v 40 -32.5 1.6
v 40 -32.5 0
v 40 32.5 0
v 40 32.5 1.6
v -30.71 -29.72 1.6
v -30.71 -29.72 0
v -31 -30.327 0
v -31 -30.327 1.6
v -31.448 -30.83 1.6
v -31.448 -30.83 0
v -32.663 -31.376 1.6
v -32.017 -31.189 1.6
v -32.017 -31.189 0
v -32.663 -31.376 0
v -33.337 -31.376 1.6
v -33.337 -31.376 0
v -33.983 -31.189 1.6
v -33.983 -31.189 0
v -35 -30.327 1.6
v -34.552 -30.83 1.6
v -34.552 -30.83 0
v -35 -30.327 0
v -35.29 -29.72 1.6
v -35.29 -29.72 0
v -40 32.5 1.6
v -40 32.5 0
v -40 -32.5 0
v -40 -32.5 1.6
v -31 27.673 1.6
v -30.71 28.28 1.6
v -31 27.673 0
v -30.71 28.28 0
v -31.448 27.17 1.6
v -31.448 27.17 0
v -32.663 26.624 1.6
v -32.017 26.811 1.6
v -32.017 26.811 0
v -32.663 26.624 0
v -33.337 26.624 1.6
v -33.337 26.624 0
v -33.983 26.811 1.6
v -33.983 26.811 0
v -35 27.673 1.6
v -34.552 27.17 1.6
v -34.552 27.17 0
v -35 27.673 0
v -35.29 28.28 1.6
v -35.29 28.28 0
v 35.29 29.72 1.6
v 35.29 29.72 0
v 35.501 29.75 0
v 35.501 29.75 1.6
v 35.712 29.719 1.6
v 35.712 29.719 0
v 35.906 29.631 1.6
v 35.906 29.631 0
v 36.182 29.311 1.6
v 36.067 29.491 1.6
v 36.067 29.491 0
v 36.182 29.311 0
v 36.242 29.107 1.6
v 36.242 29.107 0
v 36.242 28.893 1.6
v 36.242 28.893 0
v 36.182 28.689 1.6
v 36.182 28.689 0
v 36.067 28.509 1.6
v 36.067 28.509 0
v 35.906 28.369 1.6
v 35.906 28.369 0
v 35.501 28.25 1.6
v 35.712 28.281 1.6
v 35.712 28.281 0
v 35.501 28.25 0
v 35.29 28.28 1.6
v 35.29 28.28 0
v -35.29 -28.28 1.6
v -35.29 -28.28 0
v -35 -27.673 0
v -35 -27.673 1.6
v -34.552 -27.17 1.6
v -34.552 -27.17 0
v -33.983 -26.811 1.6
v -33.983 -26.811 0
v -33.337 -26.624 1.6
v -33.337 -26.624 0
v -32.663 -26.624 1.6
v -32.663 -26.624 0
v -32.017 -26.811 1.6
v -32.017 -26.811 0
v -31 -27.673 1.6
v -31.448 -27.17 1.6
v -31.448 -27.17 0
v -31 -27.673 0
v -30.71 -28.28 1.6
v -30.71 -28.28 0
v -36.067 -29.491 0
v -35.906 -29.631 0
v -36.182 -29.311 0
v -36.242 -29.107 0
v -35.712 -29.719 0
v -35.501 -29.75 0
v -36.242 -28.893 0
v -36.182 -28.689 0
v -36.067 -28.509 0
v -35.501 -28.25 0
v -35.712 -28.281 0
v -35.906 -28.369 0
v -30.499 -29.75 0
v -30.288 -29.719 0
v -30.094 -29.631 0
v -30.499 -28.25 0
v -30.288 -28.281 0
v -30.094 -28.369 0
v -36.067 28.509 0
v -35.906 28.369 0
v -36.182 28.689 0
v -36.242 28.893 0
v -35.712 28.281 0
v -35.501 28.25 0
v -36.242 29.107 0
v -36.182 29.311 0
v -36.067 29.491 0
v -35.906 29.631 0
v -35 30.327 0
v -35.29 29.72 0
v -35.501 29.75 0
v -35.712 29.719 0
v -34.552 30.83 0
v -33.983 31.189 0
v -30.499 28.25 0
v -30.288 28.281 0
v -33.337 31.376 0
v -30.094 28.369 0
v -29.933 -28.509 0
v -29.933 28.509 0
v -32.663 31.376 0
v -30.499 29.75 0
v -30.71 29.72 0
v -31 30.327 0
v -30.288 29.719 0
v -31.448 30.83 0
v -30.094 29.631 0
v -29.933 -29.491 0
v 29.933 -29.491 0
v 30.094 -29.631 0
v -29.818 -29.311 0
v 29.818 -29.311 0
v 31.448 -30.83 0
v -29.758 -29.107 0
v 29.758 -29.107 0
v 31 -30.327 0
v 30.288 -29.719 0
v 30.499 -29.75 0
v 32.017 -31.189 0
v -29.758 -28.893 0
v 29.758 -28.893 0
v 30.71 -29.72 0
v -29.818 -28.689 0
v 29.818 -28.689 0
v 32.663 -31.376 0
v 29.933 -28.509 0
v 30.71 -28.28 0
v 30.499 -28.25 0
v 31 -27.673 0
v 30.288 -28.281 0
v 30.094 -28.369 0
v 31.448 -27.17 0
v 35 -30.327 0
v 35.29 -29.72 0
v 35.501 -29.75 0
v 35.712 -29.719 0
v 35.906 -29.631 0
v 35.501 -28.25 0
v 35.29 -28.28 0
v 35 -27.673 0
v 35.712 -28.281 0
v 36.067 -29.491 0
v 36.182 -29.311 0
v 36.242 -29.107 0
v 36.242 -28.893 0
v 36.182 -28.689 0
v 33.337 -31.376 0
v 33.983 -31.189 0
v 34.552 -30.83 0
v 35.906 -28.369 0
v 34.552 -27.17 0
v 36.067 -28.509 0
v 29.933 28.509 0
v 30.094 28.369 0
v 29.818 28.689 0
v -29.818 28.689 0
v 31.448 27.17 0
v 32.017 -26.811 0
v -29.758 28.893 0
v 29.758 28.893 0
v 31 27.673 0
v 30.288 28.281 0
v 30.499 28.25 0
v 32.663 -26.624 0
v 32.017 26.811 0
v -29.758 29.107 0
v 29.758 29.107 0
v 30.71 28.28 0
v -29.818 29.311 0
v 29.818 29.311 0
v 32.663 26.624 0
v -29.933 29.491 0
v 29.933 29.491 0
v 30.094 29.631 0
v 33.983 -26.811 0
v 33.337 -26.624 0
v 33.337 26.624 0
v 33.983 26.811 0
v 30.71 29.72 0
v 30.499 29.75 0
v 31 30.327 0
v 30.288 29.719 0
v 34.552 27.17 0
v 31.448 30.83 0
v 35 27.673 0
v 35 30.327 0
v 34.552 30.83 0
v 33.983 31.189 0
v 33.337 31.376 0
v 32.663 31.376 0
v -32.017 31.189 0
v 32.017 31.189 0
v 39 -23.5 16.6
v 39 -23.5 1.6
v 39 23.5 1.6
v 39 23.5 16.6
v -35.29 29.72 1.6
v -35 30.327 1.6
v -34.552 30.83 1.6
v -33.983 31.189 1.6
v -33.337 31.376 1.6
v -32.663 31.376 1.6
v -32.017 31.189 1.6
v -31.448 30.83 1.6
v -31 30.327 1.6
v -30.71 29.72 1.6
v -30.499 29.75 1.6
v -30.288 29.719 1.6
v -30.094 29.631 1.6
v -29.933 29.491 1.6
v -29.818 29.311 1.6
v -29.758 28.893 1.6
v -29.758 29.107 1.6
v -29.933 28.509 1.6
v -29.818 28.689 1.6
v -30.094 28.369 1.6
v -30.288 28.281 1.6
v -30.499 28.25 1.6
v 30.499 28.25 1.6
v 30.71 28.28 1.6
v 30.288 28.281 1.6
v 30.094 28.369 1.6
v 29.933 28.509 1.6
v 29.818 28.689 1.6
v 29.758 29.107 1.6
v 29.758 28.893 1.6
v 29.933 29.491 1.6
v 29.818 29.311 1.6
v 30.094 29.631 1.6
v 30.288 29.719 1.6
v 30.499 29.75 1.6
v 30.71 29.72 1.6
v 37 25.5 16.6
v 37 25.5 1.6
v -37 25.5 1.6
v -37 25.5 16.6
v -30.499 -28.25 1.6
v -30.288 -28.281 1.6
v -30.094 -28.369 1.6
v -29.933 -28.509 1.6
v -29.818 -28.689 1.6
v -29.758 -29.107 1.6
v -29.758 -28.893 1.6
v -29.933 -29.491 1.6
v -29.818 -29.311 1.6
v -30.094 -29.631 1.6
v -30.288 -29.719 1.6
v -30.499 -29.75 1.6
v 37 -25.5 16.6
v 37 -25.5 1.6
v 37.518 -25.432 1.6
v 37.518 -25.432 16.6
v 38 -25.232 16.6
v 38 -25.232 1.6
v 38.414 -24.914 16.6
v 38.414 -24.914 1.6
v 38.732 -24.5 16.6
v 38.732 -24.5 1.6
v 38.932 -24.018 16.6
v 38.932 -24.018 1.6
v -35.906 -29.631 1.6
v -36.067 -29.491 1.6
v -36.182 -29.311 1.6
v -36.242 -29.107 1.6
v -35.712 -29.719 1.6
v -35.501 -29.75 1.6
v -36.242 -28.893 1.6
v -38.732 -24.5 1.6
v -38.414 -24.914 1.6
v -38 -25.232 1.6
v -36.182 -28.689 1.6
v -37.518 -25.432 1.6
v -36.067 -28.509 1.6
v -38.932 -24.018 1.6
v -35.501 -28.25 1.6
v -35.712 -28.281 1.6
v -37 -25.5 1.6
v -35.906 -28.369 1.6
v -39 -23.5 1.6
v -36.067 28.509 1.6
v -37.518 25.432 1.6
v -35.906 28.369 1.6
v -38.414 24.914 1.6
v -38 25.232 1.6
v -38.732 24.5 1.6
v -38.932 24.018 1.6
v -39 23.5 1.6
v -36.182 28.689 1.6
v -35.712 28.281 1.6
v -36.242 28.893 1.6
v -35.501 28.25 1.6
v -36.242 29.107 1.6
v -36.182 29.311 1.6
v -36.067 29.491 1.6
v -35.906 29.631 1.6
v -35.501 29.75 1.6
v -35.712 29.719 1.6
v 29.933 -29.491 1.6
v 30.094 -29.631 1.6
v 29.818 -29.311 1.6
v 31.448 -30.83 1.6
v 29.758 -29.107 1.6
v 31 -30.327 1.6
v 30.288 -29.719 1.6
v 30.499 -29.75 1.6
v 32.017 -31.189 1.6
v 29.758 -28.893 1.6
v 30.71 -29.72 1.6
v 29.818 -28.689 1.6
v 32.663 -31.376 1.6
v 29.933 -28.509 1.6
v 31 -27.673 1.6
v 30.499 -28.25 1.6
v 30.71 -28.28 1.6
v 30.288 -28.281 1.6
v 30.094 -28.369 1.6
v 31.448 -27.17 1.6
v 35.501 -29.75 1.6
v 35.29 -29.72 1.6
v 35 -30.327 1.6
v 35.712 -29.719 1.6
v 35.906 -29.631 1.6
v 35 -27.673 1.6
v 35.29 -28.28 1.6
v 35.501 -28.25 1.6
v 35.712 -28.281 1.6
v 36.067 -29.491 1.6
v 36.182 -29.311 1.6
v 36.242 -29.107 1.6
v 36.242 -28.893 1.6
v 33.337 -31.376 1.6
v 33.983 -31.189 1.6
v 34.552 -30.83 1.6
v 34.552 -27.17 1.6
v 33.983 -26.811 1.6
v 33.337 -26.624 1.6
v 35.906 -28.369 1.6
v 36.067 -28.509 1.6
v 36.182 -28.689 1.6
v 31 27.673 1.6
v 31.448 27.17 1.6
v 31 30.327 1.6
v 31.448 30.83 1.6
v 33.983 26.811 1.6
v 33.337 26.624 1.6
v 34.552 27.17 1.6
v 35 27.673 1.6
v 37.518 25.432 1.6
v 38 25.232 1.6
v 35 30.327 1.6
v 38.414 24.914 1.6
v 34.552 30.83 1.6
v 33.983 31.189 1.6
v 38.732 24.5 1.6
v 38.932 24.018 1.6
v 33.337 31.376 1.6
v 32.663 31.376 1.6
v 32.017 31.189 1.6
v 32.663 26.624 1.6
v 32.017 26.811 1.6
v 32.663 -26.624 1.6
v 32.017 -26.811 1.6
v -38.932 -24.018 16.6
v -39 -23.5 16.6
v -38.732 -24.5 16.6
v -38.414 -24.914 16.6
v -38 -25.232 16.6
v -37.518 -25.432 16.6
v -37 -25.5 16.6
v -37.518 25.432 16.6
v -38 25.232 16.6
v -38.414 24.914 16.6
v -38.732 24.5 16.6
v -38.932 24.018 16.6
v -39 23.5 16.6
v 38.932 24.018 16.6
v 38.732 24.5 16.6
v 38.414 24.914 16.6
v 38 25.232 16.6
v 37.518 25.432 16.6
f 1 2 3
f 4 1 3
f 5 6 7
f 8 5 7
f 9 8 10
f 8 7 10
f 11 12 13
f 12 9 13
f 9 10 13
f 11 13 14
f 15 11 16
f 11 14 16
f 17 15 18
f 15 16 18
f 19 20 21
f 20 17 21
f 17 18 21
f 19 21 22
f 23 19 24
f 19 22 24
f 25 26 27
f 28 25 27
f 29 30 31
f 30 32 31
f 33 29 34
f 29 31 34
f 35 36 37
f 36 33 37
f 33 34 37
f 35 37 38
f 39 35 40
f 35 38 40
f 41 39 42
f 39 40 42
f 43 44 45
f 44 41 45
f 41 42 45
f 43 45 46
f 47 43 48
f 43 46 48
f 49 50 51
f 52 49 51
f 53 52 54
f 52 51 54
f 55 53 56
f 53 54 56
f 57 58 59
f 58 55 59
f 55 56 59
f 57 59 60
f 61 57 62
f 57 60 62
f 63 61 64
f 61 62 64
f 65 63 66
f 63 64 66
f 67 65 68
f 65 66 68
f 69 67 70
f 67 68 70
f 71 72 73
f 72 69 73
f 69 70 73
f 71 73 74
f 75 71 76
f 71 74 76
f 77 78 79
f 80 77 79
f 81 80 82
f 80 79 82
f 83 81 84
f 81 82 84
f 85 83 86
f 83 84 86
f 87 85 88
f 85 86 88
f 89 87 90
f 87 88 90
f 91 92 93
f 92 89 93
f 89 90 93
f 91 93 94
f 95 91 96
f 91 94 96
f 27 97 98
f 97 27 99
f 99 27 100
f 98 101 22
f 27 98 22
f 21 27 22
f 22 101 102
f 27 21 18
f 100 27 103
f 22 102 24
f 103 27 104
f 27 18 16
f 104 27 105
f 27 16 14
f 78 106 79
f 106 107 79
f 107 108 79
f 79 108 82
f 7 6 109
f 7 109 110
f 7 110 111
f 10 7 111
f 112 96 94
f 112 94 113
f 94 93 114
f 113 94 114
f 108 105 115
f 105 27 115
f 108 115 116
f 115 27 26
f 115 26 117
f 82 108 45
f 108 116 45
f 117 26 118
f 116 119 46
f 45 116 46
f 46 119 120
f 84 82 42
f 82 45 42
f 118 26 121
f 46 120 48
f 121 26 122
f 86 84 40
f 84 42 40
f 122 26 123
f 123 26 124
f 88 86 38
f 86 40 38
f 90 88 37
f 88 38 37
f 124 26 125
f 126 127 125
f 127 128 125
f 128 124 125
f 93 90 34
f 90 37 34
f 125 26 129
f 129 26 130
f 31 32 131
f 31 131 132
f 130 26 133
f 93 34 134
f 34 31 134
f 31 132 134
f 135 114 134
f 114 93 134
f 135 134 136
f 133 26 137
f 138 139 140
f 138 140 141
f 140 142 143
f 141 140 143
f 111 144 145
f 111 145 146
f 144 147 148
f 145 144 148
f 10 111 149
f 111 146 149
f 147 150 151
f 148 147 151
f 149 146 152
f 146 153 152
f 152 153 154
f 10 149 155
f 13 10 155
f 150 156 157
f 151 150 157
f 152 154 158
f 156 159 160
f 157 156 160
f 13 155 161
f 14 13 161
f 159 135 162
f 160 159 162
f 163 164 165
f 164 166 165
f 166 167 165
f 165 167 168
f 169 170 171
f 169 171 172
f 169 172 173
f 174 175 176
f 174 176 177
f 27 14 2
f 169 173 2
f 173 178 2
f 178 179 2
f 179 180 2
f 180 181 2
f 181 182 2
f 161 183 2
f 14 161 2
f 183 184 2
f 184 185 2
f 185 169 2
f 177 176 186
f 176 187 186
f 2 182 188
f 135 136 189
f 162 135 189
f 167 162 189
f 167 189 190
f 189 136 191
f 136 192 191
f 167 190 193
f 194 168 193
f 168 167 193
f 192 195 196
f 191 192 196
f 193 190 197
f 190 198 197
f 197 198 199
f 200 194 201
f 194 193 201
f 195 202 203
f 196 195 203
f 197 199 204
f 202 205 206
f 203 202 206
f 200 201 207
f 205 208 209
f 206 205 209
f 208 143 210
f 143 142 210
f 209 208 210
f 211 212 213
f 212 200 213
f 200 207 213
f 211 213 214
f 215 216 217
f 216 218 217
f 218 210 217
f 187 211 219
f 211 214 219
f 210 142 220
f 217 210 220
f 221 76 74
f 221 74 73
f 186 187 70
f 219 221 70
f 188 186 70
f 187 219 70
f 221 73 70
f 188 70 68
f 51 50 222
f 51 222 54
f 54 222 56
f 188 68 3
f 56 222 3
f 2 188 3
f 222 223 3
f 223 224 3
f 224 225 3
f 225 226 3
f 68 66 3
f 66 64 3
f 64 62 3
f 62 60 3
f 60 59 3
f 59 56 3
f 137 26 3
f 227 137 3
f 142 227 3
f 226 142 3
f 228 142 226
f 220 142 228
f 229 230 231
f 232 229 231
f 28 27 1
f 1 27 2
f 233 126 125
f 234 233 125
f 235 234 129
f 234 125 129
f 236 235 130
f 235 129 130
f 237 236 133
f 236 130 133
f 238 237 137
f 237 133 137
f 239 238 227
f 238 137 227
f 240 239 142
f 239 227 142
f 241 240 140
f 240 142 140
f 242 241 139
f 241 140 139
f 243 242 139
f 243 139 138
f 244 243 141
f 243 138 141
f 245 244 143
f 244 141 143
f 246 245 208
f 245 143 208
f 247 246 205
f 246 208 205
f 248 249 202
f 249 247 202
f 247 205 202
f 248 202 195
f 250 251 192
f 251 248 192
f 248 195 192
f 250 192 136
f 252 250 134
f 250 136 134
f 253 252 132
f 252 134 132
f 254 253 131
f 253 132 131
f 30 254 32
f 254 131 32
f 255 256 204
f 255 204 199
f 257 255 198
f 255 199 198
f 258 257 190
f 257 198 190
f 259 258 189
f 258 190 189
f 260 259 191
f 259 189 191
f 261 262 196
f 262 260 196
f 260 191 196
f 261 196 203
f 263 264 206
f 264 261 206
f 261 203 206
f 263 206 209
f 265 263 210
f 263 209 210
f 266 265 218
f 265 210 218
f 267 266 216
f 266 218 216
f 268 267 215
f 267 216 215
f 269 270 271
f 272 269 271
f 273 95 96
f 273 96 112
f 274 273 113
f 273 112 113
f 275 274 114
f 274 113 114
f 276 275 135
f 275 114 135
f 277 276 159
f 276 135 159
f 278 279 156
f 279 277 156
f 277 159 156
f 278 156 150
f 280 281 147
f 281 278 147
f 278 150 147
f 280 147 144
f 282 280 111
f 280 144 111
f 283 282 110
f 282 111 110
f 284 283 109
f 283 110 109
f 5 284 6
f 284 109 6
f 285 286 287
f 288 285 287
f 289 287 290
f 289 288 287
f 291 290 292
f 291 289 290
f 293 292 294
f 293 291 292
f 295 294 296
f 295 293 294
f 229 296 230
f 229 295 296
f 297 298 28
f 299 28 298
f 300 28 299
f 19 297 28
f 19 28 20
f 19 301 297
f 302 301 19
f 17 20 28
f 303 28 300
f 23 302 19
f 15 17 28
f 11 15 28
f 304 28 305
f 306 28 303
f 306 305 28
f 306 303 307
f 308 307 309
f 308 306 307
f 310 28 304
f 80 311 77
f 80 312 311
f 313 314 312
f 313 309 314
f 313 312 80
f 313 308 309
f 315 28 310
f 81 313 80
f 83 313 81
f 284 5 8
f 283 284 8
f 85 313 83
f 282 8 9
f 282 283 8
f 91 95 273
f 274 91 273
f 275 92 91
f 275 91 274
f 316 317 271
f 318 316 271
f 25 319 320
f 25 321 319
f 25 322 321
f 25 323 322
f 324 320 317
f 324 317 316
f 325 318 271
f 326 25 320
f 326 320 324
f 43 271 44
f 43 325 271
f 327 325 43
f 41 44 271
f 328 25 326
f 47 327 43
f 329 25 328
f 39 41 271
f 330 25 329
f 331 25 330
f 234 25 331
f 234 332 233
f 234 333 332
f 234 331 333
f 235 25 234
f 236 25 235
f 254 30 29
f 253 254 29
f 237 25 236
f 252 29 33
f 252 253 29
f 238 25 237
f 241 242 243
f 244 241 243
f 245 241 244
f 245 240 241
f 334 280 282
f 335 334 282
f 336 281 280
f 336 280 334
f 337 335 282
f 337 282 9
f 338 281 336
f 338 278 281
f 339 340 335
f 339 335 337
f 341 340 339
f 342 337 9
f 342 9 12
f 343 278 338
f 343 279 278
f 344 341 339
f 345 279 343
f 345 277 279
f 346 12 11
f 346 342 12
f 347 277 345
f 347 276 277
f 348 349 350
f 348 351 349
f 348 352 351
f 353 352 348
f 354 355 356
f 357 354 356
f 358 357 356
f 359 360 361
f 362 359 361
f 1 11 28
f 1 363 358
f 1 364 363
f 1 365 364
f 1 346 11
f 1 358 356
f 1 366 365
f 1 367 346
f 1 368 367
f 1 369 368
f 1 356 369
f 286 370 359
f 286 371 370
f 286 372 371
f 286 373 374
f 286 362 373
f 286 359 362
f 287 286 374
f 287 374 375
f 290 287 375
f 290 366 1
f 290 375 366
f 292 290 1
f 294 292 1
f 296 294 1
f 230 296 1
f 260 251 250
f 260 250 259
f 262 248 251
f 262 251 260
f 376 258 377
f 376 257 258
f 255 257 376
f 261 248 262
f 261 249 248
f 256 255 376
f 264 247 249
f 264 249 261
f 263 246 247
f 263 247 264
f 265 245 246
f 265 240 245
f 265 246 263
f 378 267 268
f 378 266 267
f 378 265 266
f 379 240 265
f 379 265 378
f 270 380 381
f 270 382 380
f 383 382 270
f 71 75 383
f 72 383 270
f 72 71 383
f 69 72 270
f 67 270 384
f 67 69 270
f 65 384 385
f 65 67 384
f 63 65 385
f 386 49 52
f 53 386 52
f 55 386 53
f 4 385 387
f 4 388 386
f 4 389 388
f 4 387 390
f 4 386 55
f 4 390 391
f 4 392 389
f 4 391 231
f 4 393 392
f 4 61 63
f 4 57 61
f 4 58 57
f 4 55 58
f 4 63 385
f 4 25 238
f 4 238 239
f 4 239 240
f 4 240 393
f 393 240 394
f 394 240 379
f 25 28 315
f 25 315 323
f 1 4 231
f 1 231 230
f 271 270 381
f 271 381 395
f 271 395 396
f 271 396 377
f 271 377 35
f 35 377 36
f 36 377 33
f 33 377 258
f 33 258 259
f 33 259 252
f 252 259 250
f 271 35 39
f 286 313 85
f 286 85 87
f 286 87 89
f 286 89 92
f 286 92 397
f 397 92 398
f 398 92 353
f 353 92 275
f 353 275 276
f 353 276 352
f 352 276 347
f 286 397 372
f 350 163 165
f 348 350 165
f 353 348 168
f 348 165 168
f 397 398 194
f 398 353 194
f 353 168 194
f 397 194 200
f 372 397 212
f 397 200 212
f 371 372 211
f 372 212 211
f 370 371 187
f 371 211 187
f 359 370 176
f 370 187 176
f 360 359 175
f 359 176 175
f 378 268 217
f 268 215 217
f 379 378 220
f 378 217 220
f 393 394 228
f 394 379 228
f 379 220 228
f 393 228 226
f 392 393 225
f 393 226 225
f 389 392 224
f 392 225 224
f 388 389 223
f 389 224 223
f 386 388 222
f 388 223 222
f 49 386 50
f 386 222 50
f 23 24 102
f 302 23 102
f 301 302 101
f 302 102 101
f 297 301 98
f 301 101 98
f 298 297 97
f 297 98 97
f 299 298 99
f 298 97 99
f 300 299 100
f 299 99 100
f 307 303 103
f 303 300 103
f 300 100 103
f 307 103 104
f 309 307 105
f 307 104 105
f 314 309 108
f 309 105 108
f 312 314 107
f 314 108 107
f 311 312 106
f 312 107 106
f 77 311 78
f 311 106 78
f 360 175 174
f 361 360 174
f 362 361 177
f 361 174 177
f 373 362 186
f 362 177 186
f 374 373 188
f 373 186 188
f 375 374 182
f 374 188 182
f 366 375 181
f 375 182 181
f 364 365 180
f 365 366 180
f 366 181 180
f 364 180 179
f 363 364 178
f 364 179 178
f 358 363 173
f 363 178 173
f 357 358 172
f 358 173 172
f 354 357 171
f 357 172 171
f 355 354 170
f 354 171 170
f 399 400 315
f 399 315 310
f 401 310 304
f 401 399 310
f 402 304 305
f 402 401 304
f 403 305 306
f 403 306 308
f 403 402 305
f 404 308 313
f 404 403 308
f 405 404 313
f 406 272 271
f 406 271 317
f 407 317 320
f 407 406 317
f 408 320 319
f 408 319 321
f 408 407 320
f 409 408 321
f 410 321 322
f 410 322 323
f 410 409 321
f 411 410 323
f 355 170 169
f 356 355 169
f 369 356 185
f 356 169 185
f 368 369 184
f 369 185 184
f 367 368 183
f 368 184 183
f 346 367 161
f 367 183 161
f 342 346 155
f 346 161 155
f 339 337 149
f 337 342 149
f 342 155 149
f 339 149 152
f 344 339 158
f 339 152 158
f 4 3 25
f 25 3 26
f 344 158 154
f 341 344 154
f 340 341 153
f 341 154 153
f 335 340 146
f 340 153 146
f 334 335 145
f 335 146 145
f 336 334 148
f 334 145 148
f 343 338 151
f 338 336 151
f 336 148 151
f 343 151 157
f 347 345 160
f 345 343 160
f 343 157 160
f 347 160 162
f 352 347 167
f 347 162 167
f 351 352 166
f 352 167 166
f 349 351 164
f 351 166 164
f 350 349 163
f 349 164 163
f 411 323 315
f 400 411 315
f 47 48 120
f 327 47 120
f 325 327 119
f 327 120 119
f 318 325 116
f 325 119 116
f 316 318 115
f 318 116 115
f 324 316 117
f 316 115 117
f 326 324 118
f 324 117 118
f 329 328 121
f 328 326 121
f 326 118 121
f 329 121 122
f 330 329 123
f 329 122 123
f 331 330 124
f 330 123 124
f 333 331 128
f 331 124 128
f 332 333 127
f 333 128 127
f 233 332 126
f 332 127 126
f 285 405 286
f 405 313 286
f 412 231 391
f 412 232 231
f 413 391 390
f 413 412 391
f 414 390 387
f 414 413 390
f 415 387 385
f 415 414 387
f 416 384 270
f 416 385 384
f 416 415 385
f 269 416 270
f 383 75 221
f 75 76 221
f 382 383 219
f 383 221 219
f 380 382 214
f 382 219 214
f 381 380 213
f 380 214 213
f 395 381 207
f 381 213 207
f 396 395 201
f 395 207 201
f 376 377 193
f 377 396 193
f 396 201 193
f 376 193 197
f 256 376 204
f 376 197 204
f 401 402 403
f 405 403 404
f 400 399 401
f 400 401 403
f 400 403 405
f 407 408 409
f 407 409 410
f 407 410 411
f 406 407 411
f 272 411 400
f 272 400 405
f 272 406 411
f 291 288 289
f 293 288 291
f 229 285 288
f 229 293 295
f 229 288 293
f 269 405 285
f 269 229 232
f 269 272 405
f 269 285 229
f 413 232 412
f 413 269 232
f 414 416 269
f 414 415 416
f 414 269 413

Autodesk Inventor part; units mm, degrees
ref_plane "YZ Plane" through (0, 0, 0) normal (1, 0, 0) x (0, 1, 0)
ref_plane "XZ Plane" through (0, 0, 0) normal (0, 1, 0) x (-1, 0, 0)
ref_plane "XY Plane" through (0, 0, 0) normal (0, 0, 1) x (1, 0, 0)
sketch "Sketch1" plane through (0, 0, 0) normal (0, 0, 1) x (1, 0, 0)
  line L0 (40, 32.5) -> (-40, 32.5)
  line L1 (-40, 32.5) -> (-40, -32.5)
  line L2 (-40, -32.5) -> (40, -32.5)
  line L3 (40, -32.5) -> (40, 32.5)
  line L4 (40, 32.5) -> (-40, -32.5) construction
  line L5 (-40, 32.5) -> (40, -32.5) construction
  line L6 (-33, 29) -> (33, 29) construction
  line L7 (33, 29) -> (33, -29) construction
  line L8 (33, -29) -> (-33, -29) construction
  line L9 (-33, -29) -> (-33, 29) construction
  line L10 (-33, 29) -> (33, -29) construction
  line L11 (33, 29) -> (-33, -29) construction
  line L12 (40, 0) -> (-40, 0) construction
  line L13 (0, 32.5) -> (0, -32.5) construction
  circle A0 centre (33, 29) radius 2.4
  circle A1 centre (-33, 29) radius 2.4
  circle A2 centre (33, -29) radius 2.4
  circle A3 centre (-33, -29) radius 2.4
  line L14 (33, 32.25) -> (33, 25.75) construction
  arc A4 (35.2895, 28.2801) -> (35.2895, 29.7199) centre (35.5, 29) ccw
  arc A5 (30.7105, 29.7199) -> (30.7105, 28.2801) centre (30.5, 29) ccw
  arc A6 (-35.2895, 29.7199) -> (-35.2895, 28.2801) centre (-35.5, 29) ccw
  arc A7 (-30.7105, 28.2801) -> (-30.7105, 29.7199) centre (-30.5, 29) ccw
  arc A8 (35.2895, -29.7199) -> (35.2895, -28.2801) centre (35.5, -29) ccw
  arc A9 (30.7105, -28.2801) -> (30.7105, -29.7199) centre (30.5, -29) ccw
  arc A10 (-35.2895, -28.2801) -> (-35.2895, -29.7199) centre (-35.5, -29) ccw
  arc A11 (-30.7105, -29.7199) -> (-30.7105, -28.2801) centre (-30.5, -29) ccw
  line L15 (39, 25.5) -> (-39, 25.5)
  line L16 (-39, 25.5) -> (-39, -25.5)
  line L17 (-39, -25.5) -> (39, -25.5)
  line L18 (39, -25.5) -> (39, 25.5)
  line L19 (39, 25.5) -> (-39, -25.5) construction
  line L20 (-39, 25.5) -> (39, -25.5) construction
  point P0 (0, 0)
  point P1 (36.25, 29)
  point P2 (29.75, 29)
  point P3 (36.25, -29)
  point P4 (30.7105, 28.2801)
  point P5 (30.7105, 29.7199)
  point P6 (-30.7105, 29.7199)
  point P7 (-30.7105, 28.2801)
  point P8 (-35.2895, 28.2801)
  point P9 (-35.2895, 29.7199)
  point P10 (-30.7105, -28.2801)
  point P11 (-30.7105, -29.7199)
  point P12 (-35.2895, -29.7199)
  point P13 (-35.2895, -28.2801)
  point P14 (35.2895, -28.2801)
  point P15 (35.2895, -29.7199)
  point P16 (30.7105, -29.7199)
  point P17 (30.7105, -28.2801)
  dimension "d0" = 80
  dimension "d1" = 65
  dimension "d19" = 4.8
  dimension "d30" = 6.5
  dimension "d33" = 58
  dimension "d34" = 66
  dimension "d35" = 6.5
  dimension "d36" = 1.5
  dimension "d37" = 7
  dimension "d38" = 1
  dimension "d39" = 51
  dimension "d40" = 78
  dimension "d41" = 14
extrude "Extrusion1" add sketch "Sketch1" along normal blind 1.6 contours L3 L2 L1 L0 | L18 L17 L16 L15
extrude "Extrusion2" add sketch "Sketch1" along normal blind 16.6 contours L18 L17 L16 L15
fillet "Fillet1" radius 2 4 edges at (39, -25.5, 9.1) (39, 25.5, 9.1) (-39, -25.5, 9.1) (-39, 25.5, 9.1)
properties part number "SUSTAINA-ACTUATOR-POWER-BOARD" material "Acetal Resin, Black"
